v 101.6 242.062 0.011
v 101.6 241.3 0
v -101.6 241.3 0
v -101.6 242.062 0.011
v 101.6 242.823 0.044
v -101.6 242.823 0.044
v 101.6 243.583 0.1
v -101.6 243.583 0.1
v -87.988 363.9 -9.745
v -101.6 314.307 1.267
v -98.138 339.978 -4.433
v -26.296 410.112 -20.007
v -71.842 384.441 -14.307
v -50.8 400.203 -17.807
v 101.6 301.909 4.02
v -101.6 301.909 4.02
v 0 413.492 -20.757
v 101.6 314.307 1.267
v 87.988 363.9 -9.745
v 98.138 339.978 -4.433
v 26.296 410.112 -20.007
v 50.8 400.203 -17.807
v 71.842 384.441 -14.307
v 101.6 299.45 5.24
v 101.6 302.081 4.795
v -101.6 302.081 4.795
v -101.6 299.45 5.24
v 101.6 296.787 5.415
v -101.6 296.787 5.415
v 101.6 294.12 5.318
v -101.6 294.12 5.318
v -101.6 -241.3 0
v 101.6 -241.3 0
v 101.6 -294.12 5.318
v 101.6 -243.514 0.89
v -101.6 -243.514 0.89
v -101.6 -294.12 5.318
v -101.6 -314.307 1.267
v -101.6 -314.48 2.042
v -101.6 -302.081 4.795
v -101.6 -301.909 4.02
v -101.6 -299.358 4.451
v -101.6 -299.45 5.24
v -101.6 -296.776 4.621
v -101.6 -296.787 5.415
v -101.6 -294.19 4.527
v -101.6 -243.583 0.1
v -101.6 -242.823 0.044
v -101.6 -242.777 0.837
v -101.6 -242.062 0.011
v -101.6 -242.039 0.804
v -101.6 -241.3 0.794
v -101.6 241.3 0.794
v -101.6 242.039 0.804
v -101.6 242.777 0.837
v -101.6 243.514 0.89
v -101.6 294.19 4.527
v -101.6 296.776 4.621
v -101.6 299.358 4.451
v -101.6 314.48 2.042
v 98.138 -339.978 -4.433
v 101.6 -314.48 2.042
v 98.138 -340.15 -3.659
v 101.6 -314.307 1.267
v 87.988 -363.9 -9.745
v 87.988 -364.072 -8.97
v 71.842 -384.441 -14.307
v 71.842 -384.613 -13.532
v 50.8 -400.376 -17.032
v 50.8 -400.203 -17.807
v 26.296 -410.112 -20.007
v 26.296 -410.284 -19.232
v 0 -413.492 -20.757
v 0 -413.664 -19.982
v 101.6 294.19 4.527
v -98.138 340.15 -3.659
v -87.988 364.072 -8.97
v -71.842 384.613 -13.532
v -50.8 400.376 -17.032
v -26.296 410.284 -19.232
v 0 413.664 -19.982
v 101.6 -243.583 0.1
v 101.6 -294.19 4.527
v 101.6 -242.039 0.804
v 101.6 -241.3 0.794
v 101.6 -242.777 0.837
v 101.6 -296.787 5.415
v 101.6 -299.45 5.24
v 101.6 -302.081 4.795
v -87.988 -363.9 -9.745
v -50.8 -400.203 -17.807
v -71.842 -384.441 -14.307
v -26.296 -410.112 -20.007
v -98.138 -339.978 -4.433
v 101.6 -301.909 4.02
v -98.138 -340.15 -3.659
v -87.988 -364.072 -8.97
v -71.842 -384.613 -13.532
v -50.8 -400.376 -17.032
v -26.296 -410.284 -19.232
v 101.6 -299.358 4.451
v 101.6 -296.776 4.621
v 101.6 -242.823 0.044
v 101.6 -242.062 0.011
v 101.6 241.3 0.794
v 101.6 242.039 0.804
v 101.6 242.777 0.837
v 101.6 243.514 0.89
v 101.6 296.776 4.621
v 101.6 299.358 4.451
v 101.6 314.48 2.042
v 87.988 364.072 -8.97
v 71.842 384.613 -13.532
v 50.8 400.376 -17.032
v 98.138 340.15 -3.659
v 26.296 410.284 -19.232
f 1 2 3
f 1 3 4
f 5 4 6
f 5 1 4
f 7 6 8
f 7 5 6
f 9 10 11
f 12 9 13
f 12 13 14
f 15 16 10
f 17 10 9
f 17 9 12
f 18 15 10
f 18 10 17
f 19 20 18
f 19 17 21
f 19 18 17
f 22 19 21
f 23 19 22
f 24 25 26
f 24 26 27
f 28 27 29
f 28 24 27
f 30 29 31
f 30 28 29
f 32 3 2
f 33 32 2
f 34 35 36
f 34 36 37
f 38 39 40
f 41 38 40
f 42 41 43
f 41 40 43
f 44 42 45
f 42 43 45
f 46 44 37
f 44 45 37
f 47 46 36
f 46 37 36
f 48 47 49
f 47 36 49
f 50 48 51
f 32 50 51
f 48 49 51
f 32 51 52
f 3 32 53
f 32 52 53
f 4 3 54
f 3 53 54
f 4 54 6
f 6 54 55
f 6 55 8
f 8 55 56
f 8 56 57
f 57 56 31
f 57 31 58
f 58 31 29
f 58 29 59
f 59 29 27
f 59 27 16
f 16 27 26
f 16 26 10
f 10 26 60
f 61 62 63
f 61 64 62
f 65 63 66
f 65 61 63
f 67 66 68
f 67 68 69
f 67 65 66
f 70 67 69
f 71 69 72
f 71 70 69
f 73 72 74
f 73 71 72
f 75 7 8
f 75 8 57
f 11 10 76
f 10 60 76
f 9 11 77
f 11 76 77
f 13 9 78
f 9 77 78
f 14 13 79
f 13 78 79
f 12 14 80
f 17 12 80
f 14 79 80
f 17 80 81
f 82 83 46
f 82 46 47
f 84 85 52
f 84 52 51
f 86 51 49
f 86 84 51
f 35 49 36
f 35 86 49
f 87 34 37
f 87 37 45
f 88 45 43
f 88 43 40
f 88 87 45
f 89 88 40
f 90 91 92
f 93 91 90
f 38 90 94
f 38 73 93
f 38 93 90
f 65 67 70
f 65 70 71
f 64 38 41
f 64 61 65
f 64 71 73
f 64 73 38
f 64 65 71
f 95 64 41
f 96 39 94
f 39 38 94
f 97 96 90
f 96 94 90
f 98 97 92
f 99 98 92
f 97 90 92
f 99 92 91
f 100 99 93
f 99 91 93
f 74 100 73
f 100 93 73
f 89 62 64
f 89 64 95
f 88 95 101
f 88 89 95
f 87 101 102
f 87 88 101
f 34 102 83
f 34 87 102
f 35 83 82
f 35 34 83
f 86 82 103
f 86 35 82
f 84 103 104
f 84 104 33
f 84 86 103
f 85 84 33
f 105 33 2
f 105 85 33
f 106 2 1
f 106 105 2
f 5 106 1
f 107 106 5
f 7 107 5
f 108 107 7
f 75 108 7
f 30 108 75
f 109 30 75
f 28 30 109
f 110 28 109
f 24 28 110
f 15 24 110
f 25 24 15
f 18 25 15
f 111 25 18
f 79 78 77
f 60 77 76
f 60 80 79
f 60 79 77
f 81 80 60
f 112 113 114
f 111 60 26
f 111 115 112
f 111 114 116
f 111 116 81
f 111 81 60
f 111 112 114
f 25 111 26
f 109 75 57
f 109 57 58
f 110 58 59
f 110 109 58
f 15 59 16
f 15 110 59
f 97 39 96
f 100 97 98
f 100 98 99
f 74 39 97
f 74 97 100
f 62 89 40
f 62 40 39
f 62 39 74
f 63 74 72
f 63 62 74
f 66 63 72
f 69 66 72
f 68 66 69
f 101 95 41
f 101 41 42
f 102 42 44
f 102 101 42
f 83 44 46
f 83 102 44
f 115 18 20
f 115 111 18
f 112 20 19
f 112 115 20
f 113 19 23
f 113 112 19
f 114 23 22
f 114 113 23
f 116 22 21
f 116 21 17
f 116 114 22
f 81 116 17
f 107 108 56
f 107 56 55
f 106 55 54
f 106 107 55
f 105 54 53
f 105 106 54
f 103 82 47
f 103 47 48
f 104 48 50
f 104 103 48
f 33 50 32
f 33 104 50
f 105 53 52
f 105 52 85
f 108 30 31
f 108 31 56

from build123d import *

# Parameters (mm, degrees)
F0_W     = 203.2
F0_H     = 482.6
F1_DEPTH = 0.79375
F3_DEPTH = 203.2
F4_R     = 101.59999


# Not quite as in the source:
# - a fillet or chamfer is up to 0.001 mm smaller than in the source, because OpenCascade refuses the exact size


with BuildPart() as f1:
    # F0 (on Top) → F1 (new body)
    with BuildSketch(Plane.XY):
        Rectangle(F0_W, F0_H)
    extrude(amount=F1_DEPTH)

    # F2 (on face) → F3 (join, through all)
    with BuildSketch(Plane.YZ.offset(101.6)):
        with BuildLine():
            ThreePointArc((243.5137558658, 0.8904046685), (242.4079324391, 0.8179251718), (241.3, 0.79375))
            Line((241.3, 0.79375), (241.3, 0))
            ThreePointArc((241.3, 0), (242.4425553278, 0.0249306459), (243.5829357366, 0.0996751269))
            Line((243.5829357366, 0.0996751269), (294.1896263997, 4.5271868584))
            ThreePointArc((294.1896263997, 4.5271868584), (298.0689507117, 4.5691740706), (301.9094190229, 4.0198807111))
            Line((301.9094190229, 4.0198807111), (413.4915953519, -20.7572846976))
            Line((413.4915953519, -20.7572846976), (413.6636590006, -19.9824084731))
            Line((413.6636590006, -19.9824084731), (302.0814826716, 4.7947569356))
            ThreePointArc((302.0814826716, 4.7947569356), (298.1209997257, 5.3612157126), (294.1204465289, 5.3179164001))
            Line((294.1204465289, 5.3179164001), (243.5137558658, 0.8904046685))
        make_face()
        with BuildLine():
            Line((-241.3, 0), (-241.3, 0.79375))
            ThreePointArc((-241.3, 0.79375), (-242.4079324391, 0.8179251718), (-243.5137558658, 0.8904046685))
            Line((-243.5137558658, 0.8904046685), (-294.1204465289, 5.3179164001))
            ThreePointArc((-294.1204465289, 5.3179164001), (-298.1209997257, 5.3612157126), (-302.0814826716, 4.7947569356))
            Line((-302.0814826716, 4.7947569356), (-413.6636590006, -19.9824084731))
            Line((-413.6636590006, -19.9824084731), (-413.4915953519, -20.7572846976))
            Line((-413.4915953519, -20.7572846976), (-301.9094190229, 4.0198807111))
            ThreePointArc((-301.9094190229, 4.0198807111), (-298.0689507117, 4.5691740706), (-294.1896263997, 4.5271868584))
            Line((-294.1896263997, 4.5271868584), (-243.5829357366, 0.0996751269))
            ThreePointArc((-243.5829357366, 0.0996751269), (-242.4425553278, 0.0249306459), (-241.3, 0))
        make_face()
    extrude(amount=-F3_DEPTH)

    # F4 (radius 101.6 in the source; OpenCascade refuses exactly that, so slightly less here)
    f4_edges = [f1.edges().sort_by_distance(p)[0] for p in [
        (101.6, 413.577627, -20.369847),
        (-101.6, 413.577627, -20.369847),
        (101.6, -413.577627, -20.369847),
        (-101.6, -413.577627, -20.369847),
    ]]
    fillet(f4_edges, radius=F4_R)


solid = f1.part
